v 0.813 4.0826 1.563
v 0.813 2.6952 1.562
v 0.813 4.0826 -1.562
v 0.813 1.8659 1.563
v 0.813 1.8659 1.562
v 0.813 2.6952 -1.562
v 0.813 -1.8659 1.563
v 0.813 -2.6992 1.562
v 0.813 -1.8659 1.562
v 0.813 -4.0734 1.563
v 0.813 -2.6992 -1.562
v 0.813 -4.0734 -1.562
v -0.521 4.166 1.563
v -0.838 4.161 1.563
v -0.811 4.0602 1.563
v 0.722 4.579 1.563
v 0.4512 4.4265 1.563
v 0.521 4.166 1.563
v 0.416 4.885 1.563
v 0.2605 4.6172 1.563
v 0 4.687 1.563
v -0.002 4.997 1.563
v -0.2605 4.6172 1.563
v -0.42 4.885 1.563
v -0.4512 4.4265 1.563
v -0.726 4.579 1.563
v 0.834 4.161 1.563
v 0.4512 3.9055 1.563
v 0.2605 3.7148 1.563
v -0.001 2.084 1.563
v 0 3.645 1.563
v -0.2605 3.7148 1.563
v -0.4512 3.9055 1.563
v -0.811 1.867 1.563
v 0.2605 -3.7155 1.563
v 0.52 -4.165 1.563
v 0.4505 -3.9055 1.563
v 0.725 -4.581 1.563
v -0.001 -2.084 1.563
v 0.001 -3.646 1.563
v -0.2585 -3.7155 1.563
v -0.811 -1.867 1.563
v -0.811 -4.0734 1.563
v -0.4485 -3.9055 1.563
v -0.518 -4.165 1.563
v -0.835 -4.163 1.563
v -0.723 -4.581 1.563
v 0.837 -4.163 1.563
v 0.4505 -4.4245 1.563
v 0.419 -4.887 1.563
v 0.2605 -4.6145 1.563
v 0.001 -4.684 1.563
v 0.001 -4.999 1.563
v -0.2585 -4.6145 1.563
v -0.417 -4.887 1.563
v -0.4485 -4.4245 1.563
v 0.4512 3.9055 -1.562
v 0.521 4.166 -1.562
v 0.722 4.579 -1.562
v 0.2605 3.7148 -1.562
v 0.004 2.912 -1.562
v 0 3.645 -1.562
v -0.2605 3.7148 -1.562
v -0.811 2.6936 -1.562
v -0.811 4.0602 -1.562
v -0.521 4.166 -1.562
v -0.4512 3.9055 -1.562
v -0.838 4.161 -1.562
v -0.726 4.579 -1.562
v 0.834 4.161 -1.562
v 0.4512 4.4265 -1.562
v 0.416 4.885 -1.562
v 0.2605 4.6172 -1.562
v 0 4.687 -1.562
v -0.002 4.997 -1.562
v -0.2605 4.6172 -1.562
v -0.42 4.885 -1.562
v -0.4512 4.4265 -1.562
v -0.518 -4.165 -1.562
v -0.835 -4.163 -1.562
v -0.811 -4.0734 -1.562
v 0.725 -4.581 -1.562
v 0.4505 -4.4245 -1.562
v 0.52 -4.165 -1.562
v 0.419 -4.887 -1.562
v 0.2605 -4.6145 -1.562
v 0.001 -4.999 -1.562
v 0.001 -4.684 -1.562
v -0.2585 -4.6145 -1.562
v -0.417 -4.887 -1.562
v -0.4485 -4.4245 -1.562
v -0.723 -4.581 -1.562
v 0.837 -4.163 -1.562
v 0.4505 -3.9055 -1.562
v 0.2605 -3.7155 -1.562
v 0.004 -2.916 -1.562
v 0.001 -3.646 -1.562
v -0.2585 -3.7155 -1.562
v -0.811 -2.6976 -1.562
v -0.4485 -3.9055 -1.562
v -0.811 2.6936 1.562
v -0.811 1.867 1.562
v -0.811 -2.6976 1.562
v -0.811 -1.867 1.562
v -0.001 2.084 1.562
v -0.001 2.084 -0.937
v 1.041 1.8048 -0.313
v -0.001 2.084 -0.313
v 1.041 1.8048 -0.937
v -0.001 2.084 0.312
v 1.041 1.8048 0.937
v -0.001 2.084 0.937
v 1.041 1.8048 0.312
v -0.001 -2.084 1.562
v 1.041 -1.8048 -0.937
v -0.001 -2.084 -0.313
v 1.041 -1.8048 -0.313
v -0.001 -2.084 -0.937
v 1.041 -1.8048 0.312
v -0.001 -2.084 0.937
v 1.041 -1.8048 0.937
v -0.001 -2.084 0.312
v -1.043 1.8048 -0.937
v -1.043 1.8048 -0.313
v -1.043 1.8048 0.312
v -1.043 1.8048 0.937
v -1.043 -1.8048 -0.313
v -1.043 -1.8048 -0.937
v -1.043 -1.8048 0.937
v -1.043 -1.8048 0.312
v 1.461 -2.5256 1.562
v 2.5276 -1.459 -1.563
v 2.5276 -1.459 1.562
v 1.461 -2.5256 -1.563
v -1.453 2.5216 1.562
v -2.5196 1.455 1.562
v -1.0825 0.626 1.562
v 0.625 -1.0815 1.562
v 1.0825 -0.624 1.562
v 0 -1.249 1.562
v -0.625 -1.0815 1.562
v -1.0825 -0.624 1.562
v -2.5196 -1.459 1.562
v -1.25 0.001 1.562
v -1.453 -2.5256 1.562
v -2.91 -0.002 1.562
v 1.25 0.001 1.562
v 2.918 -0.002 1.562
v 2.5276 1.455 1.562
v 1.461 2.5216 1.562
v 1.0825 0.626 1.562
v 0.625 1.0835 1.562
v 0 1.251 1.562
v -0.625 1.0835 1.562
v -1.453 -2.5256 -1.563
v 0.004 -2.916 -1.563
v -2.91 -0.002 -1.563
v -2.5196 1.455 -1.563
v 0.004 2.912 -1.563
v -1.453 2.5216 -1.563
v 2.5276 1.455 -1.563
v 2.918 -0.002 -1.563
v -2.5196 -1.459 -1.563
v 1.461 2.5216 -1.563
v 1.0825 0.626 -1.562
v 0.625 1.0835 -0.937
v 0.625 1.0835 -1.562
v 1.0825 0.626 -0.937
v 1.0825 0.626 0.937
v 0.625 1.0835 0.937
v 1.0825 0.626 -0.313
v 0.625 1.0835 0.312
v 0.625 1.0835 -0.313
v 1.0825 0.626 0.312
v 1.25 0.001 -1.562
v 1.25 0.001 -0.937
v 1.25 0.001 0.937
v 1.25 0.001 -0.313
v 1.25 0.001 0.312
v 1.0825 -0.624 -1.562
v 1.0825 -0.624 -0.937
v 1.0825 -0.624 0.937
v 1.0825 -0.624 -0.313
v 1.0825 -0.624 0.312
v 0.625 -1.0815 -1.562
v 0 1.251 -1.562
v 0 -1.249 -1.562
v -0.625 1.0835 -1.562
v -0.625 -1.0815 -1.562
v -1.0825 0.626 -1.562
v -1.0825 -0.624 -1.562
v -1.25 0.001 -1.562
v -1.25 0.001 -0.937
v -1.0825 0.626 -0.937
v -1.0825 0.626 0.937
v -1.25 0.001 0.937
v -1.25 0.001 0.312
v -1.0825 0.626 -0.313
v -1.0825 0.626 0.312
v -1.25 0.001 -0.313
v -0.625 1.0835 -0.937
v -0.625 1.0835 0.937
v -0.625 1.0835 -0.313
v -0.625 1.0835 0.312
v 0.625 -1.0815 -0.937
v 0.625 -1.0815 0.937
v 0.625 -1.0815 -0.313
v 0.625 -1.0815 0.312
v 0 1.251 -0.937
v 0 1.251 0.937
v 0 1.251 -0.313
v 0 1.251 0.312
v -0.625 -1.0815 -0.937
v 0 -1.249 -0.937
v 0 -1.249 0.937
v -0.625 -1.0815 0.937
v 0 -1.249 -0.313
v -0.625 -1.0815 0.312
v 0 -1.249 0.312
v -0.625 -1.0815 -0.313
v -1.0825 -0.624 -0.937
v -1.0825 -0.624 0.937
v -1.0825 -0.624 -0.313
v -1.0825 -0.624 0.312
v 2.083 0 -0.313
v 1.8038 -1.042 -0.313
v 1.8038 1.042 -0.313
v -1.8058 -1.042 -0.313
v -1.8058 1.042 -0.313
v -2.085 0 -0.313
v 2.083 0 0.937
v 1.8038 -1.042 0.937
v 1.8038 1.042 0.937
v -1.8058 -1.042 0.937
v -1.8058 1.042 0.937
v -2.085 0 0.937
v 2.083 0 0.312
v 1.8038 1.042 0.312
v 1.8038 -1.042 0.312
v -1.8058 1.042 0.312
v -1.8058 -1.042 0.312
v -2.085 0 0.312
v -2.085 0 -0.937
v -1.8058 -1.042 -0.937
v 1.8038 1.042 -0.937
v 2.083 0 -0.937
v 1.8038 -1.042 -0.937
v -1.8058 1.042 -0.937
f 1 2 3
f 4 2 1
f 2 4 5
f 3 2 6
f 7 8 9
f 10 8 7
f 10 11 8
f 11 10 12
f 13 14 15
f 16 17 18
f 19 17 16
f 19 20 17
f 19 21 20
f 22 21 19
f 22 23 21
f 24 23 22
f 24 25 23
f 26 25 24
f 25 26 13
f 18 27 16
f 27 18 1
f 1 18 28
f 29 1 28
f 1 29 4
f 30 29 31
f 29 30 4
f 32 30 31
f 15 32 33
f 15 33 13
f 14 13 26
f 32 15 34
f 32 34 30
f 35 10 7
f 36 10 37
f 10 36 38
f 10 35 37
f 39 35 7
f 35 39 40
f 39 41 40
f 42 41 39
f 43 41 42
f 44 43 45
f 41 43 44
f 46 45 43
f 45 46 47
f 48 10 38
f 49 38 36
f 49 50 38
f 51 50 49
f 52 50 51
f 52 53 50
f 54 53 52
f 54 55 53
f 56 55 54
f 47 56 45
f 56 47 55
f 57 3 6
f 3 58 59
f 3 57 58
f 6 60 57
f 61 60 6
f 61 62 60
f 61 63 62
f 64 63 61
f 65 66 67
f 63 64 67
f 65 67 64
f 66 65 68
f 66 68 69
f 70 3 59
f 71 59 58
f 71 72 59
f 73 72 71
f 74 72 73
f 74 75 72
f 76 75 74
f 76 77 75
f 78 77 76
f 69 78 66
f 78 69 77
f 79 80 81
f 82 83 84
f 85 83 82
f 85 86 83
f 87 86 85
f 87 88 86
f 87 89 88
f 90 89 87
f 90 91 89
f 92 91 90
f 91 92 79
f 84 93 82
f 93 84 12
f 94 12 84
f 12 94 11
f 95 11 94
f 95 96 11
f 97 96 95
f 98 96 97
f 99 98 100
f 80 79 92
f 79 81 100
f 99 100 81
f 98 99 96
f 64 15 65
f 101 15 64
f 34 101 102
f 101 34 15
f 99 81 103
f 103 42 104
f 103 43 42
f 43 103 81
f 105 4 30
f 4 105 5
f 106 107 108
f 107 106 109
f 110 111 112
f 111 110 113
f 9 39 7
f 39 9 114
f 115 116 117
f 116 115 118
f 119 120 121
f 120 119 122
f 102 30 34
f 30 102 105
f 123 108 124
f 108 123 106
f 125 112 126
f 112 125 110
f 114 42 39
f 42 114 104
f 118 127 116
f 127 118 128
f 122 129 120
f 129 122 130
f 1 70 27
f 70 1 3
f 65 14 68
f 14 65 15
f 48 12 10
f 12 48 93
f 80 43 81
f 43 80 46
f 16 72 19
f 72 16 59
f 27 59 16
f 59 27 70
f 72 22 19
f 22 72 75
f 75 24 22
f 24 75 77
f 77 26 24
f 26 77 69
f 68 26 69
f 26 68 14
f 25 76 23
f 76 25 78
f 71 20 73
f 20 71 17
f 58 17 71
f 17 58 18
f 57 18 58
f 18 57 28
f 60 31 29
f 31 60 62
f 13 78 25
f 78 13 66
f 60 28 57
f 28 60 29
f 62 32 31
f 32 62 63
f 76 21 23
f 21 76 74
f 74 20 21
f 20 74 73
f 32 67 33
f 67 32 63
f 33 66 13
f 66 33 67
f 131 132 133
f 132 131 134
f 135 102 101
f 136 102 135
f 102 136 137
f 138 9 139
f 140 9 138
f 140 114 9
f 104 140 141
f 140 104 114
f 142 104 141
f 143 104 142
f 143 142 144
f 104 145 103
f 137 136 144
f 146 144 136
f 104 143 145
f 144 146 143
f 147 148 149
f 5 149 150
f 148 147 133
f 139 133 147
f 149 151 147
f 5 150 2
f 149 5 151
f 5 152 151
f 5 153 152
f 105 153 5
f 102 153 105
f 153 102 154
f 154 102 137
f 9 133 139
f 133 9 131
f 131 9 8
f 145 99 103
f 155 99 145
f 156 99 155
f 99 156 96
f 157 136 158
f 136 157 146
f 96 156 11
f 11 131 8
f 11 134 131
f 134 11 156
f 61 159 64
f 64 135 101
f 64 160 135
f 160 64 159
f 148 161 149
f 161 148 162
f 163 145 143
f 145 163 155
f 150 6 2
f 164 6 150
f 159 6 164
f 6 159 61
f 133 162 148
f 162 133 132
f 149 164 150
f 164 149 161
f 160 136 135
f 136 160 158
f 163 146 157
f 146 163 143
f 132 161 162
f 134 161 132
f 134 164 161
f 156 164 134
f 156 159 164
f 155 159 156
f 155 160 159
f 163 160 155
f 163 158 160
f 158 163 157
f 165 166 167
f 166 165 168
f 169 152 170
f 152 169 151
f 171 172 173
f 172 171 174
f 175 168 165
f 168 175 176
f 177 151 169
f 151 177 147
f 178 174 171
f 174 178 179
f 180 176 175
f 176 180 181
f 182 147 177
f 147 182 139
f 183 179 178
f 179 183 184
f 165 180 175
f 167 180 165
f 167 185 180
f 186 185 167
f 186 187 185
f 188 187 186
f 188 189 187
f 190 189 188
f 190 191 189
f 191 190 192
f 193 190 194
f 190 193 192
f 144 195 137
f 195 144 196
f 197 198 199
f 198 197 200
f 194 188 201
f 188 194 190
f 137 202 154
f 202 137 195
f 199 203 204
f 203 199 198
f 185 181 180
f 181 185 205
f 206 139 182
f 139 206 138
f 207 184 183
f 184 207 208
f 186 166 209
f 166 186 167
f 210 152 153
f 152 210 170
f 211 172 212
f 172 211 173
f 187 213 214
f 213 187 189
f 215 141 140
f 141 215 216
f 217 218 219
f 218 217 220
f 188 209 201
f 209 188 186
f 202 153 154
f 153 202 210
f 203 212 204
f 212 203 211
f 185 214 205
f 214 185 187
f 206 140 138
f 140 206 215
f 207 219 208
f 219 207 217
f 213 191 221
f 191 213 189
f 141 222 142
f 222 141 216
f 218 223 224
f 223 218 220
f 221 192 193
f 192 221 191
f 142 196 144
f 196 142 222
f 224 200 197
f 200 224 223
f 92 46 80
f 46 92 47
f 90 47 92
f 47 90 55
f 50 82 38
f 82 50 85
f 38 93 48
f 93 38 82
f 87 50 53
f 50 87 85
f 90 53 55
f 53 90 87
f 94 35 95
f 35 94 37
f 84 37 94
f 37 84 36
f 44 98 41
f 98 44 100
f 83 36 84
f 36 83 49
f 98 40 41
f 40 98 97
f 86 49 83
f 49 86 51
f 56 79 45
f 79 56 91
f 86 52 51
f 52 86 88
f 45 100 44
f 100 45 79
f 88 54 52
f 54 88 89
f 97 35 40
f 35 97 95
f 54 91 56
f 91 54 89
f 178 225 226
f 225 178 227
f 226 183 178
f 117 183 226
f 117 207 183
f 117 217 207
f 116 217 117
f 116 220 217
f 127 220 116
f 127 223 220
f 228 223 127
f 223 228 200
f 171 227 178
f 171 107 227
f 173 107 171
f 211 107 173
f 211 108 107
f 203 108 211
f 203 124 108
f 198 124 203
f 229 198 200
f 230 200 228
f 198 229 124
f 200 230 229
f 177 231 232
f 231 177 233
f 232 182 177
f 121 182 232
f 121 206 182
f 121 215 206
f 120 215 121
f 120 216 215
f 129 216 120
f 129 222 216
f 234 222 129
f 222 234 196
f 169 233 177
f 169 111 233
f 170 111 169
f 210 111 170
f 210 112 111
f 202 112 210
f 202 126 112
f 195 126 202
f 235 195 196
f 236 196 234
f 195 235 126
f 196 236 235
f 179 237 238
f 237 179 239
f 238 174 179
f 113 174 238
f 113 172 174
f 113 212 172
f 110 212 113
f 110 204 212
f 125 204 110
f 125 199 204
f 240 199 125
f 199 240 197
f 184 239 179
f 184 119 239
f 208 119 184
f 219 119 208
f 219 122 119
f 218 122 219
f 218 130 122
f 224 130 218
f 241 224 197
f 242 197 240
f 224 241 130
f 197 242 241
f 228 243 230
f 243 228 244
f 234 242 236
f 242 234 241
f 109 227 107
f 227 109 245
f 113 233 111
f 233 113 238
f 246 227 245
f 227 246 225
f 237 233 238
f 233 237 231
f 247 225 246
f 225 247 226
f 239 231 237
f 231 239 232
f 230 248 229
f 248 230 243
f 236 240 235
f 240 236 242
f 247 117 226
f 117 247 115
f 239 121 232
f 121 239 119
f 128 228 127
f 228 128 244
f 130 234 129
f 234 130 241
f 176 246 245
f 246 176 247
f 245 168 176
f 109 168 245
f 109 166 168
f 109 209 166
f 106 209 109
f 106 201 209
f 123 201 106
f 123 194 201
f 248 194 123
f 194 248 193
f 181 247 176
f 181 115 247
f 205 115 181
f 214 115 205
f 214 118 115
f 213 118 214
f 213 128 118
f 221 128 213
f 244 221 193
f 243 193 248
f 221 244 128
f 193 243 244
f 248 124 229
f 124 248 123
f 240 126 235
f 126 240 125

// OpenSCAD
intersection() {
translate([-3.5, -6, -1.875]) cube(size = [7, 12, 3.75], center = false);
union() {
difference() {
difference() {
rotate([0, 0, 0])
translate([-0.811, -4.165, -1.562]) cube(size = [1.624, 8.331, 3.125], center = false);
translate([-0.001, 0, -18.1])
cylinder(h = 19.663, r1 = 2.084, r2 = 2.084, center = false, $fn = 12);
}
union() {
translate([-0.002, 4.161, -1.562])
cylinder(h = 19.663, r1 = 0.836, r2 = 0.836, center = false, $fn = 12);
translate([0.001, -4.163, -1.562])
cylinder(h = 19.663, r1 = 0.836, r2 = 0.836, center = false, $fn = 12);
}
}
difference() {
translate([-0.002, 4.161, -1.562])
cylinder(h = 3.125, r1 = 0.836, r2 = 0.836, center = false, $fn = 12);
translate([0, 4.166, -1.562])
cylinder(h = 3.125, r1 = 0.521, r2 = 0.521, center = false, $fn = 12);
}
difference() {
union() {
difference() {
rotate([180, 0, 180])
translate([-0.004, -0.002, -1.562])
cylinder(h = 3.125, r1 = 2.914, r2 = 2.914, center = false, $fn = 12);
translate([0, 0.001, -1.562])
cylinder(h = 19.663, r1 = 1.25, r2 = 1.25, center = false, $fn = 12);
}
difference() {
translate([0.001, -4.163, -1.562])
cylinder(h = 3.125, r1 = 0.836, r2 = 0.836, center = false, $fn = 12);
translate([0.001, -4.165, -18.1])
cylinder(h = 19.663, r1 = 0.519, r2 = 0.519, center = false, $fn = 12);
}
}
difference() {
translate([-0.001, 0, -0.937])
cylinder(h = 19.038, r1 = 2.084, r2 = 2.084, center = false, $fn = 12);
difference() {
rotate([0, 0, 0])
translate([-18.1, -4.165, -0.313]) cube(size = [36.2, 8.331, 1.875], center = false);
rotate([180, 0, 180])
translate([-0.004, -0.002, -0.937])
cylinder(h = 0.625, r1 = 2.914, r2 = 2.914, center = false, $fn = 12);
}
}
}
}
}
